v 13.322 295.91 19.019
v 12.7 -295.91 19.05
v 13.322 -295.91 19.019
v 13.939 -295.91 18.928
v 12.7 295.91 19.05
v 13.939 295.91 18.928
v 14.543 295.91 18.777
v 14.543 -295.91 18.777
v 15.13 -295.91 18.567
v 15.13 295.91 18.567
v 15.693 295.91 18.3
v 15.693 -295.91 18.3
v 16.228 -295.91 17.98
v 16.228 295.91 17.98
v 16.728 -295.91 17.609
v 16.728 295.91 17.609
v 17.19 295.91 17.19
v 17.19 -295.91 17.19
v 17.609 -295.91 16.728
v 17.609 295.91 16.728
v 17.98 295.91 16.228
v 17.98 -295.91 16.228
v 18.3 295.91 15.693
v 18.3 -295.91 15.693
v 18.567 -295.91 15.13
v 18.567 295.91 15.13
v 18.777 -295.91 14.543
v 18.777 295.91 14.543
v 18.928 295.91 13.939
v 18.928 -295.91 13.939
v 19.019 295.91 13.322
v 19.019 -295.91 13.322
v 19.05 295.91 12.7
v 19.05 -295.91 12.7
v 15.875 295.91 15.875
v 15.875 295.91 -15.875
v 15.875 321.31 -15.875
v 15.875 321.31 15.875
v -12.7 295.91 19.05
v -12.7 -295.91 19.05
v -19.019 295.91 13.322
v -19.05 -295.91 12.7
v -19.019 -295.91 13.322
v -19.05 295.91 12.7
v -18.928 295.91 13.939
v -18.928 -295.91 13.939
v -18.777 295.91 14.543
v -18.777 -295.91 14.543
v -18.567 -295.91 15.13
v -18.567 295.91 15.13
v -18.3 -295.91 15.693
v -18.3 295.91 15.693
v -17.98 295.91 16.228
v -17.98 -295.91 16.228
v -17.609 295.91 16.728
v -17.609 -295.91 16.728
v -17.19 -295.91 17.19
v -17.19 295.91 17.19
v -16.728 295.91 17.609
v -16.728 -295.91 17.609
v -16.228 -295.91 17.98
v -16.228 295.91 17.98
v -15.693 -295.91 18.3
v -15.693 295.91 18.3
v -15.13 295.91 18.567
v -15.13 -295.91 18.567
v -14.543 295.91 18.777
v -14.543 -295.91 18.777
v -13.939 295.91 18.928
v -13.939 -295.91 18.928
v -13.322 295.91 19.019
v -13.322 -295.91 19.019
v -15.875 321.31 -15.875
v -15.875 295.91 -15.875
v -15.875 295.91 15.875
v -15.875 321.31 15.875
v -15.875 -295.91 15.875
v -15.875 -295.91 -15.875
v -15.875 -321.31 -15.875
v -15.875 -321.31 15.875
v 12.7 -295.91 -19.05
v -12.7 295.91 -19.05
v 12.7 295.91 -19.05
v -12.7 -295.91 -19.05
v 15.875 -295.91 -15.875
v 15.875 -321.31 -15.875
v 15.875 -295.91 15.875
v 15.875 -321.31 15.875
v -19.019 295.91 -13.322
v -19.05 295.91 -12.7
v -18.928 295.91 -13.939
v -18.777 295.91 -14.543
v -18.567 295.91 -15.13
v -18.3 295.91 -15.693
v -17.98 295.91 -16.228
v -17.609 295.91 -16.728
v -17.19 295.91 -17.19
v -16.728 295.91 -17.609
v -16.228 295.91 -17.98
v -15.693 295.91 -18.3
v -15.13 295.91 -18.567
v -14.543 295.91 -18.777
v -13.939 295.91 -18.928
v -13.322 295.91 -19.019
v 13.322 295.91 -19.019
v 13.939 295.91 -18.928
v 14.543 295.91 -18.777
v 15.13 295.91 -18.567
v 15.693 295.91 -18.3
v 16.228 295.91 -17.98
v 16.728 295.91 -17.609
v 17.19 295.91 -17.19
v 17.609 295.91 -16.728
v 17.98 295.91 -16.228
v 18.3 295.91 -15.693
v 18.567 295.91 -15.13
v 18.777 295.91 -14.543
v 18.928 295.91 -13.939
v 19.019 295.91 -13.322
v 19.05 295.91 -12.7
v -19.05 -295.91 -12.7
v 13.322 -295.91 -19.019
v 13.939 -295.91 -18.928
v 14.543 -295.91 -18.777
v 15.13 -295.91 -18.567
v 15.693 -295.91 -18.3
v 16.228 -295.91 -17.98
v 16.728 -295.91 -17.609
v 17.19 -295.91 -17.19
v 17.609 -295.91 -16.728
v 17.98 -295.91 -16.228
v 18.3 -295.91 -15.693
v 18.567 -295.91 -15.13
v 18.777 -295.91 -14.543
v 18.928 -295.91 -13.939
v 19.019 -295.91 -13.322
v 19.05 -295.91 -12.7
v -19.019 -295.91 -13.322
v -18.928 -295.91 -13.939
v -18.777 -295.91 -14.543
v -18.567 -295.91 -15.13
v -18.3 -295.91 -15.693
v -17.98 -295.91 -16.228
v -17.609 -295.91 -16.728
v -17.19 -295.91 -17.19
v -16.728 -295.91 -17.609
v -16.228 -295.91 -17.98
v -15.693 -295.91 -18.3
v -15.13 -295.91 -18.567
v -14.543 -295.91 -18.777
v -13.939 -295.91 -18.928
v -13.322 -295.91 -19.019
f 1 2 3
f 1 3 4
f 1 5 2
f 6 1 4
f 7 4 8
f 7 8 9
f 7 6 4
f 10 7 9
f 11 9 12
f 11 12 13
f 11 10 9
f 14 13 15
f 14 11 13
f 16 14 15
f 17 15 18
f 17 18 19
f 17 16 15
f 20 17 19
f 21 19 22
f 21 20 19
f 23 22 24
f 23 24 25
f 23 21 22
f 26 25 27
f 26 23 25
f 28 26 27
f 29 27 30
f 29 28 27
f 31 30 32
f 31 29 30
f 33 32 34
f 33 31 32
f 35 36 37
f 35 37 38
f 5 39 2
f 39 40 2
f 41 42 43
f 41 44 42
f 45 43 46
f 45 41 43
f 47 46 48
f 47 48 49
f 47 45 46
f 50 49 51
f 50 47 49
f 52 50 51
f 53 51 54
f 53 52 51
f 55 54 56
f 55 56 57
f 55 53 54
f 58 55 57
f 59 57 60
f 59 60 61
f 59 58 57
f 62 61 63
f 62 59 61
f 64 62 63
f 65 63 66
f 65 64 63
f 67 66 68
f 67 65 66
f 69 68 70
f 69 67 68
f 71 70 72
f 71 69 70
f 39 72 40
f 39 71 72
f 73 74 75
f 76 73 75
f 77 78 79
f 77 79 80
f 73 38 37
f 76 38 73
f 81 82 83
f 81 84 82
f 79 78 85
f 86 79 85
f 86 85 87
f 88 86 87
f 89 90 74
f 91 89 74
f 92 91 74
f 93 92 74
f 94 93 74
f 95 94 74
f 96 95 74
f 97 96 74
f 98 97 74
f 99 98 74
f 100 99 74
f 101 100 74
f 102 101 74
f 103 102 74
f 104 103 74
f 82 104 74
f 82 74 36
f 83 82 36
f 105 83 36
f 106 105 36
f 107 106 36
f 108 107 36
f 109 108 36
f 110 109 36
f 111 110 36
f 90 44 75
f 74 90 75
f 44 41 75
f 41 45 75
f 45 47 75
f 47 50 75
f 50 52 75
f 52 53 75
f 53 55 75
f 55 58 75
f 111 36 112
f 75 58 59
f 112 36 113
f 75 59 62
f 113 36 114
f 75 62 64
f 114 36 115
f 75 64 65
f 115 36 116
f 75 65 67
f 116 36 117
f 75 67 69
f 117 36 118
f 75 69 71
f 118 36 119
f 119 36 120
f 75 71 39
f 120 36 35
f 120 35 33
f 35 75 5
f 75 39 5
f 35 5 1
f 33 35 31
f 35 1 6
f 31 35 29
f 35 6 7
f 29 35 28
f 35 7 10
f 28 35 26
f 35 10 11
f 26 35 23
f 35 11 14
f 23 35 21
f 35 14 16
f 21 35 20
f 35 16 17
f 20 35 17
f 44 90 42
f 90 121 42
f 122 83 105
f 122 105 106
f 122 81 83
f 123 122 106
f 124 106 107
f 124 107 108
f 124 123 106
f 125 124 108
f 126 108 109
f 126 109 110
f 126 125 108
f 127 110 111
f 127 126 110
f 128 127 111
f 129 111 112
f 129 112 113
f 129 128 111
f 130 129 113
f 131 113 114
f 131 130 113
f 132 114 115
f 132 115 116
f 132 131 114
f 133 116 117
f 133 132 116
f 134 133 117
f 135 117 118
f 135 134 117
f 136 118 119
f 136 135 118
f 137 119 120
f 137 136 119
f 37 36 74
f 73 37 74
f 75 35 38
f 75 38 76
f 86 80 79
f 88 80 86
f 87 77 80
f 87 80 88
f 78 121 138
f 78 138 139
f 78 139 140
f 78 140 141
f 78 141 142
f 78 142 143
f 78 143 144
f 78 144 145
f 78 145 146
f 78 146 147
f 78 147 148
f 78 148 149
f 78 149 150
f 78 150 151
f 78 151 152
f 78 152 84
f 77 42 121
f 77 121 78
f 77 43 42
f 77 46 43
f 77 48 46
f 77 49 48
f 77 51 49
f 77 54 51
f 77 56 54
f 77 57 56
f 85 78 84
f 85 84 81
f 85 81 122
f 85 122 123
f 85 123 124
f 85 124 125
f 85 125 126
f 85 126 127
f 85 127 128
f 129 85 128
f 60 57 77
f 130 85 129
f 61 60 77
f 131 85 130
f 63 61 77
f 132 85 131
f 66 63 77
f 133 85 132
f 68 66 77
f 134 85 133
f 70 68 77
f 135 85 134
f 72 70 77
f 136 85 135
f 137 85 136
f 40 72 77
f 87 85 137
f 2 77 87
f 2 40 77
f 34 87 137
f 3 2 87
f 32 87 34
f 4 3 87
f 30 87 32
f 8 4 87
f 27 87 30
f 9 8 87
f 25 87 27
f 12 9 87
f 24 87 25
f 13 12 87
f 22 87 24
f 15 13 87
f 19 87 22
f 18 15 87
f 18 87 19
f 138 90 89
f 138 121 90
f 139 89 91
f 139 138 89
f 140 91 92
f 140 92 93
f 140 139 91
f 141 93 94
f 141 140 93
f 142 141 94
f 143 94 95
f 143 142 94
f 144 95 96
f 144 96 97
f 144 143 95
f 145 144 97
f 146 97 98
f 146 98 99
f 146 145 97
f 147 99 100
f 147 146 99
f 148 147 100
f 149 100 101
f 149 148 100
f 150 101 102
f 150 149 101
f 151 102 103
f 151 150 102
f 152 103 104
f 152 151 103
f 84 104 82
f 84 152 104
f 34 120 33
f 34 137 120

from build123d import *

# Parameters (mm, degrees)
F0_W     = 38.1
F0_H     = 38.1
F1_DEPTH = 295.91
F2_W     = 31.75
F2_H     = 31.75
F3_DEPTH = 25.4
F4_W     = 31.75
F4_H     = 31.75
F5_DEPTH = 25.4
F6_R     = 6.35


with BuildPart() as f1:
    # F0 (on Front) → F1 (new body, symmetric)
    with BuildSketch(Plane.XZ):
        Rectangle(F0_W, F0_H)
    extrude(amount=F1_DEPTH, both=True)

    # F2 (on face) → F3 (join)
    with BuildSketch(Plane(origin=(0, 295.91, 0), x_dir=(-1, 0, 0), z_dir=(0, 1, 0))):
        Rectangle(F2_W, F2_H)
    extrude(amount=F3_DEPTH)

    # F4 (on face) → F5 (join)
    with BuildSketch(Plane.XZ.offset(295.91)):
        Rectangle(F4_W, F4_H)
    extrude(amount=F5_DEPTH)

    # F6
    f6_edges = [f1.edges().sort_by_distance(p)[0] for p in [
        (19.05, 0, 19.05),
        (19.05, 0, -19.05),
        (-19.05, 0, -19.05),
        (-19.05, 0, 19.05),
    ]]
    fillet(f6_edges, radius=F6_R)


solid = f1.part
